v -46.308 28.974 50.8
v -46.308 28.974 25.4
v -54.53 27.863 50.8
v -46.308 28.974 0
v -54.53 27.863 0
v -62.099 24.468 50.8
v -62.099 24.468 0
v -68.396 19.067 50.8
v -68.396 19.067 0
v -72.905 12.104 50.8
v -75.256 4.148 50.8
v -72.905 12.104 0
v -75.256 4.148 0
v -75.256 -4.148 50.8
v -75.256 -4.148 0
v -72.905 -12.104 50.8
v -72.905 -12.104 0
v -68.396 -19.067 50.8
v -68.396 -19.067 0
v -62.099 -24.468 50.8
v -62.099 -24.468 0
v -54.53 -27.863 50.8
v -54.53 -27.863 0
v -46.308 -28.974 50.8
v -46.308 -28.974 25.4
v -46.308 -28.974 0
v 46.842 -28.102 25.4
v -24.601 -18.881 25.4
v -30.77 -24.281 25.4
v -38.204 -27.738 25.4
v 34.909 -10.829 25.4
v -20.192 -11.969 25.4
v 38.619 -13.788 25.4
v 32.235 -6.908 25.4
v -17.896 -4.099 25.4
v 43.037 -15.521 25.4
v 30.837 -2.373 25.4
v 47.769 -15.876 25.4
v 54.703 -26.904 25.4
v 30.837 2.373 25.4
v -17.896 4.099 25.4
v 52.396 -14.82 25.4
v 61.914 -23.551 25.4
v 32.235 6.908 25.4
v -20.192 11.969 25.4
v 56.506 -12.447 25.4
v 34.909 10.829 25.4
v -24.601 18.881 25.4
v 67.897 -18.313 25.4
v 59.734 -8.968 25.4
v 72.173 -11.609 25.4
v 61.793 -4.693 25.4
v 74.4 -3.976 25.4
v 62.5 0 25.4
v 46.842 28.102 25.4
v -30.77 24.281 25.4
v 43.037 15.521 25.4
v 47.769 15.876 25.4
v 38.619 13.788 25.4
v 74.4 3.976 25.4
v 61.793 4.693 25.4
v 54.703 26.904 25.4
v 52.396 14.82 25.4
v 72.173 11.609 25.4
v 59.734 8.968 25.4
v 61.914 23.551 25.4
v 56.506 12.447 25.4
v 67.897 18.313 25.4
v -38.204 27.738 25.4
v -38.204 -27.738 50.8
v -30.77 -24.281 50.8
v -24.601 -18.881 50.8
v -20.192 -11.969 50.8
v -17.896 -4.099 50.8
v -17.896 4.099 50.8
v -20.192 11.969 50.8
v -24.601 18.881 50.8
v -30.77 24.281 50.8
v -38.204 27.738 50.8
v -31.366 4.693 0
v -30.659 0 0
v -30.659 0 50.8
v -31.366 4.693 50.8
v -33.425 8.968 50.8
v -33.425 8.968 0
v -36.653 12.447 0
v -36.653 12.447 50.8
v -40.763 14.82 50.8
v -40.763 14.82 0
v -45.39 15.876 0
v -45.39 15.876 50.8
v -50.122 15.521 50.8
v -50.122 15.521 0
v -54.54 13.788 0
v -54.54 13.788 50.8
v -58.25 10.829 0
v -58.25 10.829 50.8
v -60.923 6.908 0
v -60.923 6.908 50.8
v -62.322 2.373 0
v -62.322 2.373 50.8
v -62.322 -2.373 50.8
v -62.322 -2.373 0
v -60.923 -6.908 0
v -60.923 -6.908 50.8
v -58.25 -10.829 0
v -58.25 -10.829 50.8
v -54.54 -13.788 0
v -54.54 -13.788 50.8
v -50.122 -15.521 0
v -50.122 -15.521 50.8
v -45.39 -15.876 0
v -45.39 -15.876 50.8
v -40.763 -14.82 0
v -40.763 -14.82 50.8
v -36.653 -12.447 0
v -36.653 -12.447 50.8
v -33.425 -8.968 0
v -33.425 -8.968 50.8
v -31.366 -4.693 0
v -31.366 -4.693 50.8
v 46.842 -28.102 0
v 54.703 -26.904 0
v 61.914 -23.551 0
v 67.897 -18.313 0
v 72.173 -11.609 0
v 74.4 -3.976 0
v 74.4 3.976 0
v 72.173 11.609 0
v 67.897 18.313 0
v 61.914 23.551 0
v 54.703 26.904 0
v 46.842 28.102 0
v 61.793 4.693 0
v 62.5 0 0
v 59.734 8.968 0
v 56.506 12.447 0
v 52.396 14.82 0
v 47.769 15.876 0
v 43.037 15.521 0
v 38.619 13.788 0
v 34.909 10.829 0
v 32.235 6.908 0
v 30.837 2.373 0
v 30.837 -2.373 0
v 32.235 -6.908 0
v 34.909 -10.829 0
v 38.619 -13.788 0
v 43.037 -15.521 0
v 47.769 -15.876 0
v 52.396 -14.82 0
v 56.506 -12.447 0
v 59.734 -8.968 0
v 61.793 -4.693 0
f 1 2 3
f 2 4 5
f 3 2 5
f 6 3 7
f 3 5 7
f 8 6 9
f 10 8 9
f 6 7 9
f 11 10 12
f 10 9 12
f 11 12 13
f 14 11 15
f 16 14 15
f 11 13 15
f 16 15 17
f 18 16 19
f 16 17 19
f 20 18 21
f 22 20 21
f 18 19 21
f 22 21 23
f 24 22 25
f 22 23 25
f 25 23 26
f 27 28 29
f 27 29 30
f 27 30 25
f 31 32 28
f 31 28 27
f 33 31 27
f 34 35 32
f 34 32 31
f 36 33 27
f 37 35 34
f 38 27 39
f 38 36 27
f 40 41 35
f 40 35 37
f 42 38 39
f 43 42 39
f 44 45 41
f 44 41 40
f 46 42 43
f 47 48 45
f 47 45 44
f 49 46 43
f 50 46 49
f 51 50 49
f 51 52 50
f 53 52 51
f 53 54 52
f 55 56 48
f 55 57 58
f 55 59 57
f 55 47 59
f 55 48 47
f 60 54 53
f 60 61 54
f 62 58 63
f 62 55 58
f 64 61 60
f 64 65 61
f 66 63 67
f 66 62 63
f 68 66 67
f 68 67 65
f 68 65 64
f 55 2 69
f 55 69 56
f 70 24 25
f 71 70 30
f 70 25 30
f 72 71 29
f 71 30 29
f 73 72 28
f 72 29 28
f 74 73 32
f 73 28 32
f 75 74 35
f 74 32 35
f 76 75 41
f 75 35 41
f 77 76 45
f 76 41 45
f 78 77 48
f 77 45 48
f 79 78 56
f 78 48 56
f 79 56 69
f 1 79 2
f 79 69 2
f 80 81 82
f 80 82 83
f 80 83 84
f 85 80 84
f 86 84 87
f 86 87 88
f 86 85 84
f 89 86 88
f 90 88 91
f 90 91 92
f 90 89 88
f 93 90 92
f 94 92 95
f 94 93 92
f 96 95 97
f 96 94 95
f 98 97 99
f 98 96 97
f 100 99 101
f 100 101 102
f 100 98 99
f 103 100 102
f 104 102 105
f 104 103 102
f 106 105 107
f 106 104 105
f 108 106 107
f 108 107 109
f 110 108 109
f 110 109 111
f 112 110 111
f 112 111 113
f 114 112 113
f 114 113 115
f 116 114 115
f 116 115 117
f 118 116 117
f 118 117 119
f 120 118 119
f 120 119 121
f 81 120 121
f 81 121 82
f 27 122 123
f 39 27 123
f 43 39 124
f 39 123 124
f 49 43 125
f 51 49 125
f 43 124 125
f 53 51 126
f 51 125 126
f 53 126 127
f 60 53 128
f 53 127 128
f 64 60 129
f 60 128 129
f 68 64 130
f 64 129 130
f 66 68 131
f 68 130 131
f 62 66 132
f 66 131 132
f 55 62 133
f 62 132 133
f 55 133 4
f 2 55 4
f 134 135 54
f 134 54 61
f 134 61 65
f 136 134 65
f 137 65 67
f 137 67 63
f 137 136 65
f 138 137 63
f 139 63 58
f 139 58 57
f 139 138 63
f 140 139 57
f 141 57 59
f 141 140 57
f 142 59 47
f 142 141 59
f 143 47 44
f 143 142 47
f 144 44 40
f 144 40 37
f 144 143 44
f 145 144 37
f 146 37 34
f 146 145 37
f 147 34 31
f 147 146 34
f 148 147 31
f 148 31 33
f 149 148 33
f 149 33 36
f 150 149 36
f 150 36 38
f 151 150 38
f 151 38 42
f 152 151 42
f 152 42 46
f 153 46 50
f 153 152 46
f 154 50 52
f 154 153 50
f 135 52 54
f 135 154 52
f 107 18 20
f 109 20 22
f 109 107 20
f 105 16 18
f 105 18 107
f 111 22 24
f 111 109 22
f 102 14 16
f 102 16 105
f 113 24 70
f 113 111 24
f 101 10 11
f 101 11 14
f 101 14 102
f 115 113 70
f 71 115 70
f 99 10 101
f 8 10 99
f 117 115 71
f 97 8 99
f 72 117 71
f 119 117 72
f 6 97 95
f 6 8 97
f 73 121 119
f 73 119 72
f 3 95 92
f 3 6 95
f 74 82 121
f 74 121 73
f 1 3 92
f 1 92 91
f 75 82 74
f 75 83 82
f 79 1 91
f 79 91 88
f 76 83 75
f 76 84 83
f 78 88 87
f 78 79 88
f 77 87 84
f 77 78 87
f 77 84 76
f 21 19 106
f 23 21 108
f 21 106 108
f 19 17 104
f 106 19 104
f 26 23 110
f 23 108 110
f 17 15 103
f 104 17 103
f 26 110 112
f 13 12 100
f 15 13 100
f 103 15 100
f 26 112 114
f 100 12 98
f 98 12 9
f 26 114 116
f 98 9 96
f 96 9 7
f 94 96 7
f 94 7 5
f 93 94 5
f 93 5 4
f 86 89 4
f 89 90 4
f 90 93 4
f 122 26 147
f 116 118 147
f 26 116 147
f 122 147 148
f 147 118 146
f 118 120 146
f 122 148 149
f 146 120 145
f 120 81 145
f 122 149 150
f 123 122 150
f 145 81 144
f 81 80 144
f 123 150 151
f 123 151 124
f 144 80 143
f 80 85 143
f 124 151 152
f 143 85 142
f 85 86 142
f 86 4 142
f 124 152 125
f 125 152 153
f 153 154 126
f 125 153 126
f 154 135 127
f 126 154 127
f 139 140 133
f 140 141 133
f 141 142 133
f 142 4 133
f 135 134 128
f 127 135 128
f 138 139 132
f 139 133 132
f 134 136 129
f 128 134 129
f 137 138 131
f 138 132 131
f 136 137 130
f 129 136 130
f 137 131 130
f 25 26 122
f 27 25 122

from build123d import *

# Parameters (mm, degrees)
F0_R     = 15.920661
F1_DEPTH = 25.4
F2_DEPTH = 25.4
F3_DEPTH = 50.8


with BuildPart() as f1:
    # F0 (on Top) → F1 (new body)
    with BuildSketch(Plane.XY):
        with BuildLine():
            ThreePointArc((-46.308367, -28.973528), (-17.604609, 0), (-46.308367, 28.973528))
            ThreePointArc((-46.308367, 28.973528), (-75.554202, 0), (-46.308367, -28.973528))
        make_face()
        with Locations((-46.579406, 0)):
            Circle(F0_R, mode=Mode.SUBTRACT)
    extrude(amount=F1_DEPTH)

    # F0 (on Top) → F2 (join)
    with BuildSketch(Plane.XY):
        with BuildLine():
            Line((46.842293, 28.102132), (-46.308367, 28.973528))
            ThreePointArc((-46.308367, 28.973528), (-17.604609, 0), (-46.308367, -28.973528))
            Line((-46.308367, -28.973528), (46.842293, -28.102132))
            ThreePointArc((46.842293, -28.102132), (74.682768, 0), (46.842293, 28.102132))
        make_face()
        with Locations((46.579406, 0)):
            Circle(F0_R, mode=Mode.SUBTRACT)
    extrude(amount=F2_DEPTH)

    # F0 (on Top) → F3 (join)
    with BuildSketch(Plane.XY):
        with BuildLine():
            ThreePointArc((-46.308367, -28.973528), (-17.604609, 0), (-46.308367, 28.973528))
            ThreePointArc((-46.308367, 28.973528), (-75.554202, 0), (-46.308367, -28.973528))
        make_face()
        with Locations((-46.579406, 0)):
            Circle(F0_R, mode=Mode.SUBTRACT)
    extrude(amount=F3_DEPTH)


solid = f1.part
